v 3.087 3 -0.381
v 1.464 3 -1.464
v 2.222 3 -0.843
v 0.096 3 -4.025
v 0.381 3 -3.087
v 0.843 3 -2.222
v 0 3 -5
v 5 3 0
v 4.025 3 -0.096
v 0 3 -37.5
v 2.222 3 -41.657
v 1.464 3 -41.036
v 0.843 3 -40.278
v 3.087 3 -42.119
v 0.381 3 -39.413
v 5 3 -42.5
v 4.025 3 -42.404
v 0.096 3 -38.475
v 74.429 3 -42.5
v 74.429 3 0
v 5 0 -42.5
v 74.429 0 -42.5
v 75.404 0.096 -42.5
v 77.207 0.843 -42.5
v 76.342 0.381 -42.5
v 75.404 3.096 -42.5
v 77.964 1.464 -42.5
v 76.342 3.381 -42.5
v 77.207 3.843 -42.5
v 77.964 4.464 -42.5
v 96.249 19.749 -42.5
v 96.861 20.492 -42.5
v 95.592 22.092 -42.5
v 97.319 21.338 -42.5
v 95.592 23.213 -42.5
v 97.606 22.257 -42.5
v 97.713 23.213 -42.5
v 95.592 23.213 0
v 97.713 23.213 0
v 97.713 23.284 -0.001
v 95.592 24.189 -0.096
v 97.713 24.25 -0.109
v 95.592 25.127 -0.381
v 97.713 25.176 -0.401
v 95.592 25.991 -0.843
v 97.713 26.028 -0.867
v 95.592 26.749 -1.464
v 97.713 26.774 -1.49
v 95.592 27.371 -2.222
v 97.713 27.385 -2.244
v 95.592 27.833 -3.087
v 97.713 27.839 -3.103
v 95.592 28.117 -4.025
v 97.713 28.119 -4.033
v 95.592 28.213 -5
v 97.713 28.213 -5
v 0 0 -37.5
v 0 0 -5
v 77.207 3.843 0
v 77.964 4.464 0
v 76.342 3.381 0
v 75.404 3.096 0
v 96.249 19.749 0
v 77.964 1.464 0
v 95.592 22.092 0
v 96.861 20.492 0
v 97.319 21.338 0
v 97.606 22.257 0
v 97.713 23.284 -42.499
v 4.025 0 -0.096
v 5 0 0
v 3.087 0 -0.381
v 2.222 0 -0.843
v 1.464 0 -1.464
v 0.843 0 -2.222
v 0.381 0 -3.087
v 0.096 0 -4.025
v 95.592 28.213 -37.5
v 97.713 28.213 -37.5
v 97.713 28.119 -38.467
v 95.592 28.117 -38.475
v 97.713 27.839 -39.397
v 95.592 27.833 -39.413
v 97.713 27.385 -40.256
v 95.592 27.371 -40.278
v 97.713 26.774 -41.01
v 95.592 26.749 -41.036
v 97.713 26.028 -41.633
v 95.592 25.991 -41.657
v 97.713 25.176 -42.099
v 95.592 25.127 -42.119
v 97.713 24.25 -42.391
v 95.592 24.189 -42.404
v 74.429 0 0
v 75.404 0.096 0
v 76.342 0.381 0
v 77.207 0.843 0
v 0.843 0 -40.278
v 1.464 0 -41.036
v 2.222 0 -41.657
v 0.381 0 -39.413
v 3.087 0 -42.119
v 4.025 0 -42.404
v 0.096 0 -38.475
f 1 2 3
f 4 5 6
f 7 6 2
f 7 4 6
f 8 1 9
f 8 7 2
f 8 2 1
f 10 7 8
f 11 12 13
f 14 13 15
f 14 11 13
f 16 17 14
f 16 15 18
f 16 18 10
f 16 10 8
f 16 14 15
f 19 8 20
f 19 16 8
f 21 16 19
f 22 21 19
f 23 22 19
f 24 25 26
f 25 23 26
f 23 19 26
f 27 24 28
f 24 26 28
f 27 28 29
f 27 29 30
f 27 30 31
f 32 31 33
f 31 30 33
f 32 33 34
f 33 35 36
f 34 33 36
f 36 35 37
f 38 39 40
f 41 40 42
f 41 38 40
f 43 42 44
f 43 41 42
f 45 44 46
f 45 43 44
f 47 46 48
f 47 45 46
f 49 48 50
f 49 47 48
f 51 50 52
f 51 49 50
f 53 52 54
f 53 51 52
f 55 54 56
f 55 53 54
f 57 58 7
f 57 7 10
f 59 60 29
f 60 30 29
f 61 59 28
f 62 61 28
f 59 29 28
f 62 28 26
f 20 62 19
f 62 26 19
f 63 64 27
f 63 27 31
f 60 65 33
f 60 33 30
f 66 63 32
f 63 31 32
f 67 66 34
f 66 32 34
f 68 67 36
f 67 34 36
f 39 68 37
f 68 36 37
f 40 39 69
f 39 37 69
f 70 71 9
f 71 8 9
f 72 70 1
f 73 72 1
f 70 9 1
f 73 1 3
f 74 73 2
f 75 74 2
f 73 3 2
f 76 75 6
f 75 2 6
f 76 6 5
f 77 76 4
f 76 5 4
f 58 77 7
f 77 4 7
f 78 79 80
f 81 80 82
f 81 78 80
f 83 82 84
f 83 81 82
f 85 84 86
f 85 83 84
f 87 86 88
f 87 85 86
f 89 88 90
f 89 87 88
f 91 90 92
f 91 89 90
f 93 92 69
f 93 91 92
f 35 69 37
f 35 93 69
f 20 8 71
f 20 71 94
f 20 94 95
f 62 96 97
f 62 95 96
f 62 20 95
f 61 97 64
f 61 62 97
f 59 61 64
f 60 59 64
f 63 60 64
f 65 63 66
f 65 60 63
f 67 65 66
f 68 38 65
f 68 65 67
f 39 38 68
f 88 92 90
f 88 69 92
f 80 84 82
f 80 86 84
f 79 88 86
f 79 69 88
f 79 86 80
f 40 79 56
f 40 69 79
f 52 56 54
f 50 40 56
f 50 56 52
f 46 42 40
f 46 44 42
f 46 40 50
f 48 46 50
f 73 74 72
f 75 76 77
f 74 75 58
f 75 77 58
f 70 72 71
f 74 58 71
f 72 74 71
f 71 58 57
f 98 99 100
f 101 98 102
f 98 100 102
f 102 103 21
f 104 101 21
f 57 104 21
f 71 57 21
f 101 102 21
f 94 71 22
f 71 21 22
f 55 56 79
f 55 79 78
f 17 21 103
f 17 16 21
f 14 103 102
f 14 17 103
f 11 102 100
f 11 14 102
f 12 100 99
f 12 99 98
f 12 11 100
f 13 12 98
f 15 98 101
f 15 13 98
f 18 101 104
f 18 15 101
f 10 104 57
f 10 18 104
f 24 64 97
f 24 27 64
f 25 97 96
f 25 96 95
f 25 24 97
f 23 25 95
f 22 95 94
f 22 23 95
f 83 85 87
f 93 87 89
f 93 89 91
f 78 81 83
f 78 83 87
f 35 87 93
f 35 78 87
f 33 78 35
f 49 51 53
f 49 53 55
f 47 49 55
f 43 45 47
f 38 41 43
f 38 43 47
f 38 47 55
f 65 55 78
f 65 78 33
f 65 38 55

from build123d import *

# Parameters (mm, degrees)
SKETCH1_W           = 76.5
SKETCH1_H           = 42.5
BOSS_EXTRUDE1_DEPTH = 3
BOSS_EXTRUDE2_DEPTH = 42.5
FILLET1_R           = 5
FILLET2_R           = 5
FILLET3_R           = 5
FILLET4_R           = 5


with BuildPart() as part:
    # Sketch1 → Boss-Extrude1 (new body)
    with BuildSketch(Plane(origin=(0, 0, 0), x_dir=(1, 0, 0), z_dir=(0, 1, 0))):
        with Locations((38.25, 21.25)):
            Rectangle(SKETCH1_W, SKETCH1_H)
    extrude(amount=BOSS_EXTRUDE1_DEPTH)

    # Sketch2 → Boss-Extrude2 (add)
    with BuildSketch(Plane.XY):
        Polygon((76.5, 3), (76.5, 0), (97.713203436, 21.213203436), (97.713203436, 28.213203436), (95.591883092, 28.213203436), (95.591883092, 22.091883092), align=None)
    extrude(amount=-BOSS_EXTRUDE2_DEPTH)

    # Fillet1
    fillet1_edges = [part.edges().sort_by_distance(p)[0] for p in [
        (97.713203436, 21.213203436, -21.25),
        (76.5, 0, -21.25),
    ]]
    fillet(fillet1_edges, radius=FILLET1_R)

    # Fillet2
    fillet2_edges = [part.edges().sort_by_distance(p)[0] for p in [
        (0, 1.5, -42.5),
        (0, 1.5, 0),
    ]]
    fillet(fillet2_edges, radius=FILLET2_R)

    # Fillet3
    fillet3_edges = [part.edges().sort_by_distance(p)[0] for p in [
        (96.652543264, 28.213203436, 0),
        (96.652543264, 28.213203436, -42.5),
    ]]
    fillet(fillet3_edges, radius=FILLET3_R)

    # Fillet4
    fillet4_edges = [part.edges().sort_by_distance(p)[0] for p in [
        (76.5, 3, -21.25),
    ]]
    fillet(fillet4_edges, radius=FILLET4_R)


solid = part.part
